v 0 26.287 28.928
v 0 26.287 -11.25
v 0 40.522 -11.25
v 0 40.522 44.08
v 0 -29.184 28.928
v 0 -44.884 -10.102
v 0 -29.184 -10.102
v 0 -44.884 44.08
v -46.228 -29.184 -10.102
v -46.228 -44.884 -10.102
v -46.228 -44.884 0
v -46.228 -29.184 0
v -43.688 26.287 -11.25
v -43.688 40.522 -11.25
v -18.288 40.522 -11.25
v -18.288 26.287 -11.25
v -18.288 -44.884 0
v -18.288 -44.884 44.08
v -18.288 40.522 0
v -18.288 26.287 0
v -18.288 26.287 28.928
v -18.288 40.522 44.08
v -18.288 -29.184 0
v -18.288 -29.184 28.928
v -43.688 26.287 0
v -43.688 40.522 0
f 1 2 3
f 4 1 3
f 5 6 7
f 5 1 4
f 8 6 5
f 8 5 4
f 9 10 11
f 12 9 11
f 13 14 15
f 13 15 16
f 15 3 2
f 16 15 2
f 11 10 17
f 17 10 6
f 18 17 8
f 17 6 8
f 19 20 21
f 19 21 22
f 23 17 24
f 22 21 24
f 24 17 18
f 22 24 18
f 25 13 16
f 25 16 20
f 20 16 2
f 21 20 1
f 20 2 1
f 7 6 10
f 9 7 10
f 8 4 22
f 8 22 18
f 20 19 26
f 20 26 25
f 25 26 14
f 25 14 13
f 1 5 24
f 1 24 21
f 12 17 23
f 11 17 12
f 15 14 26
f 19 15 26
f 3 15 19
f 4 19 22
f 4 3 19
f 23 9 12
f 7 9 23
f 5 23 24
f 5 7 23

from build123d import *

# Parameters (mm, degrees)
F1_DEPTH = 18.288
F2_W     = 14.2342057079
F2_H     = 11.2496130168
F3_DEPTH = 25.4
F4_W     = 12.39753142
F4_H     = 10.101692751
F5_DEPTH = 27.94
F6_DEPTH = 3.302


with BuildPart() as f1:
    # F0 (on Right) → F1 (new body)
    with BuildSketch(Plane.YZ):
        Polygon((-44.8836572468, 44.0801158547), (-44.8836572468, -10.101692751), (-32.4861258268, -10.101692751), (-32.4861258268, 28.9275757968), (26.2873601168, 28.9275757968), (26.2873601168, -11.2496130168), (40.5215658247, -11.2496130168), (40.5215658247, 44.0801158547), align=None)
    extrude(amount=-F1_DEPTH)

    # F2 (on face) → F3 (join)
    with BuildSketch(Plane(origin=(-18.288, 0, 0), x_dir=(0, -1, 0), z_dir=(-1, 0, 0))):
        with Locations((-33.4044629708, -5.6248065084)):
            Rectangle(F2_W, F2_H)
    extrude(amount=F3_DEPTH)

    # F4 (on face) → F5 (join)
    with BuildSketch(Plane(origin=(-18.288, 0, 0), x_dir=(0, -1, 0), z_dir=(-1, 0, 0))):
        with Locations((38.6848915368, -5.0508463755)):
            Rectangle(F4_W, F4_H)
    extrude(amount=F5_DEPTH)

    # F6 (add): a face of the model
    f6_faces = [f1.faces().sort_by_distance(p)[0] for p in [
        (-15.6938687201, -32.4861258268, 5.3143038172),
    ]]
    extrude(f6_faces, amount=F6_DEPTH)


solid = f1.part
